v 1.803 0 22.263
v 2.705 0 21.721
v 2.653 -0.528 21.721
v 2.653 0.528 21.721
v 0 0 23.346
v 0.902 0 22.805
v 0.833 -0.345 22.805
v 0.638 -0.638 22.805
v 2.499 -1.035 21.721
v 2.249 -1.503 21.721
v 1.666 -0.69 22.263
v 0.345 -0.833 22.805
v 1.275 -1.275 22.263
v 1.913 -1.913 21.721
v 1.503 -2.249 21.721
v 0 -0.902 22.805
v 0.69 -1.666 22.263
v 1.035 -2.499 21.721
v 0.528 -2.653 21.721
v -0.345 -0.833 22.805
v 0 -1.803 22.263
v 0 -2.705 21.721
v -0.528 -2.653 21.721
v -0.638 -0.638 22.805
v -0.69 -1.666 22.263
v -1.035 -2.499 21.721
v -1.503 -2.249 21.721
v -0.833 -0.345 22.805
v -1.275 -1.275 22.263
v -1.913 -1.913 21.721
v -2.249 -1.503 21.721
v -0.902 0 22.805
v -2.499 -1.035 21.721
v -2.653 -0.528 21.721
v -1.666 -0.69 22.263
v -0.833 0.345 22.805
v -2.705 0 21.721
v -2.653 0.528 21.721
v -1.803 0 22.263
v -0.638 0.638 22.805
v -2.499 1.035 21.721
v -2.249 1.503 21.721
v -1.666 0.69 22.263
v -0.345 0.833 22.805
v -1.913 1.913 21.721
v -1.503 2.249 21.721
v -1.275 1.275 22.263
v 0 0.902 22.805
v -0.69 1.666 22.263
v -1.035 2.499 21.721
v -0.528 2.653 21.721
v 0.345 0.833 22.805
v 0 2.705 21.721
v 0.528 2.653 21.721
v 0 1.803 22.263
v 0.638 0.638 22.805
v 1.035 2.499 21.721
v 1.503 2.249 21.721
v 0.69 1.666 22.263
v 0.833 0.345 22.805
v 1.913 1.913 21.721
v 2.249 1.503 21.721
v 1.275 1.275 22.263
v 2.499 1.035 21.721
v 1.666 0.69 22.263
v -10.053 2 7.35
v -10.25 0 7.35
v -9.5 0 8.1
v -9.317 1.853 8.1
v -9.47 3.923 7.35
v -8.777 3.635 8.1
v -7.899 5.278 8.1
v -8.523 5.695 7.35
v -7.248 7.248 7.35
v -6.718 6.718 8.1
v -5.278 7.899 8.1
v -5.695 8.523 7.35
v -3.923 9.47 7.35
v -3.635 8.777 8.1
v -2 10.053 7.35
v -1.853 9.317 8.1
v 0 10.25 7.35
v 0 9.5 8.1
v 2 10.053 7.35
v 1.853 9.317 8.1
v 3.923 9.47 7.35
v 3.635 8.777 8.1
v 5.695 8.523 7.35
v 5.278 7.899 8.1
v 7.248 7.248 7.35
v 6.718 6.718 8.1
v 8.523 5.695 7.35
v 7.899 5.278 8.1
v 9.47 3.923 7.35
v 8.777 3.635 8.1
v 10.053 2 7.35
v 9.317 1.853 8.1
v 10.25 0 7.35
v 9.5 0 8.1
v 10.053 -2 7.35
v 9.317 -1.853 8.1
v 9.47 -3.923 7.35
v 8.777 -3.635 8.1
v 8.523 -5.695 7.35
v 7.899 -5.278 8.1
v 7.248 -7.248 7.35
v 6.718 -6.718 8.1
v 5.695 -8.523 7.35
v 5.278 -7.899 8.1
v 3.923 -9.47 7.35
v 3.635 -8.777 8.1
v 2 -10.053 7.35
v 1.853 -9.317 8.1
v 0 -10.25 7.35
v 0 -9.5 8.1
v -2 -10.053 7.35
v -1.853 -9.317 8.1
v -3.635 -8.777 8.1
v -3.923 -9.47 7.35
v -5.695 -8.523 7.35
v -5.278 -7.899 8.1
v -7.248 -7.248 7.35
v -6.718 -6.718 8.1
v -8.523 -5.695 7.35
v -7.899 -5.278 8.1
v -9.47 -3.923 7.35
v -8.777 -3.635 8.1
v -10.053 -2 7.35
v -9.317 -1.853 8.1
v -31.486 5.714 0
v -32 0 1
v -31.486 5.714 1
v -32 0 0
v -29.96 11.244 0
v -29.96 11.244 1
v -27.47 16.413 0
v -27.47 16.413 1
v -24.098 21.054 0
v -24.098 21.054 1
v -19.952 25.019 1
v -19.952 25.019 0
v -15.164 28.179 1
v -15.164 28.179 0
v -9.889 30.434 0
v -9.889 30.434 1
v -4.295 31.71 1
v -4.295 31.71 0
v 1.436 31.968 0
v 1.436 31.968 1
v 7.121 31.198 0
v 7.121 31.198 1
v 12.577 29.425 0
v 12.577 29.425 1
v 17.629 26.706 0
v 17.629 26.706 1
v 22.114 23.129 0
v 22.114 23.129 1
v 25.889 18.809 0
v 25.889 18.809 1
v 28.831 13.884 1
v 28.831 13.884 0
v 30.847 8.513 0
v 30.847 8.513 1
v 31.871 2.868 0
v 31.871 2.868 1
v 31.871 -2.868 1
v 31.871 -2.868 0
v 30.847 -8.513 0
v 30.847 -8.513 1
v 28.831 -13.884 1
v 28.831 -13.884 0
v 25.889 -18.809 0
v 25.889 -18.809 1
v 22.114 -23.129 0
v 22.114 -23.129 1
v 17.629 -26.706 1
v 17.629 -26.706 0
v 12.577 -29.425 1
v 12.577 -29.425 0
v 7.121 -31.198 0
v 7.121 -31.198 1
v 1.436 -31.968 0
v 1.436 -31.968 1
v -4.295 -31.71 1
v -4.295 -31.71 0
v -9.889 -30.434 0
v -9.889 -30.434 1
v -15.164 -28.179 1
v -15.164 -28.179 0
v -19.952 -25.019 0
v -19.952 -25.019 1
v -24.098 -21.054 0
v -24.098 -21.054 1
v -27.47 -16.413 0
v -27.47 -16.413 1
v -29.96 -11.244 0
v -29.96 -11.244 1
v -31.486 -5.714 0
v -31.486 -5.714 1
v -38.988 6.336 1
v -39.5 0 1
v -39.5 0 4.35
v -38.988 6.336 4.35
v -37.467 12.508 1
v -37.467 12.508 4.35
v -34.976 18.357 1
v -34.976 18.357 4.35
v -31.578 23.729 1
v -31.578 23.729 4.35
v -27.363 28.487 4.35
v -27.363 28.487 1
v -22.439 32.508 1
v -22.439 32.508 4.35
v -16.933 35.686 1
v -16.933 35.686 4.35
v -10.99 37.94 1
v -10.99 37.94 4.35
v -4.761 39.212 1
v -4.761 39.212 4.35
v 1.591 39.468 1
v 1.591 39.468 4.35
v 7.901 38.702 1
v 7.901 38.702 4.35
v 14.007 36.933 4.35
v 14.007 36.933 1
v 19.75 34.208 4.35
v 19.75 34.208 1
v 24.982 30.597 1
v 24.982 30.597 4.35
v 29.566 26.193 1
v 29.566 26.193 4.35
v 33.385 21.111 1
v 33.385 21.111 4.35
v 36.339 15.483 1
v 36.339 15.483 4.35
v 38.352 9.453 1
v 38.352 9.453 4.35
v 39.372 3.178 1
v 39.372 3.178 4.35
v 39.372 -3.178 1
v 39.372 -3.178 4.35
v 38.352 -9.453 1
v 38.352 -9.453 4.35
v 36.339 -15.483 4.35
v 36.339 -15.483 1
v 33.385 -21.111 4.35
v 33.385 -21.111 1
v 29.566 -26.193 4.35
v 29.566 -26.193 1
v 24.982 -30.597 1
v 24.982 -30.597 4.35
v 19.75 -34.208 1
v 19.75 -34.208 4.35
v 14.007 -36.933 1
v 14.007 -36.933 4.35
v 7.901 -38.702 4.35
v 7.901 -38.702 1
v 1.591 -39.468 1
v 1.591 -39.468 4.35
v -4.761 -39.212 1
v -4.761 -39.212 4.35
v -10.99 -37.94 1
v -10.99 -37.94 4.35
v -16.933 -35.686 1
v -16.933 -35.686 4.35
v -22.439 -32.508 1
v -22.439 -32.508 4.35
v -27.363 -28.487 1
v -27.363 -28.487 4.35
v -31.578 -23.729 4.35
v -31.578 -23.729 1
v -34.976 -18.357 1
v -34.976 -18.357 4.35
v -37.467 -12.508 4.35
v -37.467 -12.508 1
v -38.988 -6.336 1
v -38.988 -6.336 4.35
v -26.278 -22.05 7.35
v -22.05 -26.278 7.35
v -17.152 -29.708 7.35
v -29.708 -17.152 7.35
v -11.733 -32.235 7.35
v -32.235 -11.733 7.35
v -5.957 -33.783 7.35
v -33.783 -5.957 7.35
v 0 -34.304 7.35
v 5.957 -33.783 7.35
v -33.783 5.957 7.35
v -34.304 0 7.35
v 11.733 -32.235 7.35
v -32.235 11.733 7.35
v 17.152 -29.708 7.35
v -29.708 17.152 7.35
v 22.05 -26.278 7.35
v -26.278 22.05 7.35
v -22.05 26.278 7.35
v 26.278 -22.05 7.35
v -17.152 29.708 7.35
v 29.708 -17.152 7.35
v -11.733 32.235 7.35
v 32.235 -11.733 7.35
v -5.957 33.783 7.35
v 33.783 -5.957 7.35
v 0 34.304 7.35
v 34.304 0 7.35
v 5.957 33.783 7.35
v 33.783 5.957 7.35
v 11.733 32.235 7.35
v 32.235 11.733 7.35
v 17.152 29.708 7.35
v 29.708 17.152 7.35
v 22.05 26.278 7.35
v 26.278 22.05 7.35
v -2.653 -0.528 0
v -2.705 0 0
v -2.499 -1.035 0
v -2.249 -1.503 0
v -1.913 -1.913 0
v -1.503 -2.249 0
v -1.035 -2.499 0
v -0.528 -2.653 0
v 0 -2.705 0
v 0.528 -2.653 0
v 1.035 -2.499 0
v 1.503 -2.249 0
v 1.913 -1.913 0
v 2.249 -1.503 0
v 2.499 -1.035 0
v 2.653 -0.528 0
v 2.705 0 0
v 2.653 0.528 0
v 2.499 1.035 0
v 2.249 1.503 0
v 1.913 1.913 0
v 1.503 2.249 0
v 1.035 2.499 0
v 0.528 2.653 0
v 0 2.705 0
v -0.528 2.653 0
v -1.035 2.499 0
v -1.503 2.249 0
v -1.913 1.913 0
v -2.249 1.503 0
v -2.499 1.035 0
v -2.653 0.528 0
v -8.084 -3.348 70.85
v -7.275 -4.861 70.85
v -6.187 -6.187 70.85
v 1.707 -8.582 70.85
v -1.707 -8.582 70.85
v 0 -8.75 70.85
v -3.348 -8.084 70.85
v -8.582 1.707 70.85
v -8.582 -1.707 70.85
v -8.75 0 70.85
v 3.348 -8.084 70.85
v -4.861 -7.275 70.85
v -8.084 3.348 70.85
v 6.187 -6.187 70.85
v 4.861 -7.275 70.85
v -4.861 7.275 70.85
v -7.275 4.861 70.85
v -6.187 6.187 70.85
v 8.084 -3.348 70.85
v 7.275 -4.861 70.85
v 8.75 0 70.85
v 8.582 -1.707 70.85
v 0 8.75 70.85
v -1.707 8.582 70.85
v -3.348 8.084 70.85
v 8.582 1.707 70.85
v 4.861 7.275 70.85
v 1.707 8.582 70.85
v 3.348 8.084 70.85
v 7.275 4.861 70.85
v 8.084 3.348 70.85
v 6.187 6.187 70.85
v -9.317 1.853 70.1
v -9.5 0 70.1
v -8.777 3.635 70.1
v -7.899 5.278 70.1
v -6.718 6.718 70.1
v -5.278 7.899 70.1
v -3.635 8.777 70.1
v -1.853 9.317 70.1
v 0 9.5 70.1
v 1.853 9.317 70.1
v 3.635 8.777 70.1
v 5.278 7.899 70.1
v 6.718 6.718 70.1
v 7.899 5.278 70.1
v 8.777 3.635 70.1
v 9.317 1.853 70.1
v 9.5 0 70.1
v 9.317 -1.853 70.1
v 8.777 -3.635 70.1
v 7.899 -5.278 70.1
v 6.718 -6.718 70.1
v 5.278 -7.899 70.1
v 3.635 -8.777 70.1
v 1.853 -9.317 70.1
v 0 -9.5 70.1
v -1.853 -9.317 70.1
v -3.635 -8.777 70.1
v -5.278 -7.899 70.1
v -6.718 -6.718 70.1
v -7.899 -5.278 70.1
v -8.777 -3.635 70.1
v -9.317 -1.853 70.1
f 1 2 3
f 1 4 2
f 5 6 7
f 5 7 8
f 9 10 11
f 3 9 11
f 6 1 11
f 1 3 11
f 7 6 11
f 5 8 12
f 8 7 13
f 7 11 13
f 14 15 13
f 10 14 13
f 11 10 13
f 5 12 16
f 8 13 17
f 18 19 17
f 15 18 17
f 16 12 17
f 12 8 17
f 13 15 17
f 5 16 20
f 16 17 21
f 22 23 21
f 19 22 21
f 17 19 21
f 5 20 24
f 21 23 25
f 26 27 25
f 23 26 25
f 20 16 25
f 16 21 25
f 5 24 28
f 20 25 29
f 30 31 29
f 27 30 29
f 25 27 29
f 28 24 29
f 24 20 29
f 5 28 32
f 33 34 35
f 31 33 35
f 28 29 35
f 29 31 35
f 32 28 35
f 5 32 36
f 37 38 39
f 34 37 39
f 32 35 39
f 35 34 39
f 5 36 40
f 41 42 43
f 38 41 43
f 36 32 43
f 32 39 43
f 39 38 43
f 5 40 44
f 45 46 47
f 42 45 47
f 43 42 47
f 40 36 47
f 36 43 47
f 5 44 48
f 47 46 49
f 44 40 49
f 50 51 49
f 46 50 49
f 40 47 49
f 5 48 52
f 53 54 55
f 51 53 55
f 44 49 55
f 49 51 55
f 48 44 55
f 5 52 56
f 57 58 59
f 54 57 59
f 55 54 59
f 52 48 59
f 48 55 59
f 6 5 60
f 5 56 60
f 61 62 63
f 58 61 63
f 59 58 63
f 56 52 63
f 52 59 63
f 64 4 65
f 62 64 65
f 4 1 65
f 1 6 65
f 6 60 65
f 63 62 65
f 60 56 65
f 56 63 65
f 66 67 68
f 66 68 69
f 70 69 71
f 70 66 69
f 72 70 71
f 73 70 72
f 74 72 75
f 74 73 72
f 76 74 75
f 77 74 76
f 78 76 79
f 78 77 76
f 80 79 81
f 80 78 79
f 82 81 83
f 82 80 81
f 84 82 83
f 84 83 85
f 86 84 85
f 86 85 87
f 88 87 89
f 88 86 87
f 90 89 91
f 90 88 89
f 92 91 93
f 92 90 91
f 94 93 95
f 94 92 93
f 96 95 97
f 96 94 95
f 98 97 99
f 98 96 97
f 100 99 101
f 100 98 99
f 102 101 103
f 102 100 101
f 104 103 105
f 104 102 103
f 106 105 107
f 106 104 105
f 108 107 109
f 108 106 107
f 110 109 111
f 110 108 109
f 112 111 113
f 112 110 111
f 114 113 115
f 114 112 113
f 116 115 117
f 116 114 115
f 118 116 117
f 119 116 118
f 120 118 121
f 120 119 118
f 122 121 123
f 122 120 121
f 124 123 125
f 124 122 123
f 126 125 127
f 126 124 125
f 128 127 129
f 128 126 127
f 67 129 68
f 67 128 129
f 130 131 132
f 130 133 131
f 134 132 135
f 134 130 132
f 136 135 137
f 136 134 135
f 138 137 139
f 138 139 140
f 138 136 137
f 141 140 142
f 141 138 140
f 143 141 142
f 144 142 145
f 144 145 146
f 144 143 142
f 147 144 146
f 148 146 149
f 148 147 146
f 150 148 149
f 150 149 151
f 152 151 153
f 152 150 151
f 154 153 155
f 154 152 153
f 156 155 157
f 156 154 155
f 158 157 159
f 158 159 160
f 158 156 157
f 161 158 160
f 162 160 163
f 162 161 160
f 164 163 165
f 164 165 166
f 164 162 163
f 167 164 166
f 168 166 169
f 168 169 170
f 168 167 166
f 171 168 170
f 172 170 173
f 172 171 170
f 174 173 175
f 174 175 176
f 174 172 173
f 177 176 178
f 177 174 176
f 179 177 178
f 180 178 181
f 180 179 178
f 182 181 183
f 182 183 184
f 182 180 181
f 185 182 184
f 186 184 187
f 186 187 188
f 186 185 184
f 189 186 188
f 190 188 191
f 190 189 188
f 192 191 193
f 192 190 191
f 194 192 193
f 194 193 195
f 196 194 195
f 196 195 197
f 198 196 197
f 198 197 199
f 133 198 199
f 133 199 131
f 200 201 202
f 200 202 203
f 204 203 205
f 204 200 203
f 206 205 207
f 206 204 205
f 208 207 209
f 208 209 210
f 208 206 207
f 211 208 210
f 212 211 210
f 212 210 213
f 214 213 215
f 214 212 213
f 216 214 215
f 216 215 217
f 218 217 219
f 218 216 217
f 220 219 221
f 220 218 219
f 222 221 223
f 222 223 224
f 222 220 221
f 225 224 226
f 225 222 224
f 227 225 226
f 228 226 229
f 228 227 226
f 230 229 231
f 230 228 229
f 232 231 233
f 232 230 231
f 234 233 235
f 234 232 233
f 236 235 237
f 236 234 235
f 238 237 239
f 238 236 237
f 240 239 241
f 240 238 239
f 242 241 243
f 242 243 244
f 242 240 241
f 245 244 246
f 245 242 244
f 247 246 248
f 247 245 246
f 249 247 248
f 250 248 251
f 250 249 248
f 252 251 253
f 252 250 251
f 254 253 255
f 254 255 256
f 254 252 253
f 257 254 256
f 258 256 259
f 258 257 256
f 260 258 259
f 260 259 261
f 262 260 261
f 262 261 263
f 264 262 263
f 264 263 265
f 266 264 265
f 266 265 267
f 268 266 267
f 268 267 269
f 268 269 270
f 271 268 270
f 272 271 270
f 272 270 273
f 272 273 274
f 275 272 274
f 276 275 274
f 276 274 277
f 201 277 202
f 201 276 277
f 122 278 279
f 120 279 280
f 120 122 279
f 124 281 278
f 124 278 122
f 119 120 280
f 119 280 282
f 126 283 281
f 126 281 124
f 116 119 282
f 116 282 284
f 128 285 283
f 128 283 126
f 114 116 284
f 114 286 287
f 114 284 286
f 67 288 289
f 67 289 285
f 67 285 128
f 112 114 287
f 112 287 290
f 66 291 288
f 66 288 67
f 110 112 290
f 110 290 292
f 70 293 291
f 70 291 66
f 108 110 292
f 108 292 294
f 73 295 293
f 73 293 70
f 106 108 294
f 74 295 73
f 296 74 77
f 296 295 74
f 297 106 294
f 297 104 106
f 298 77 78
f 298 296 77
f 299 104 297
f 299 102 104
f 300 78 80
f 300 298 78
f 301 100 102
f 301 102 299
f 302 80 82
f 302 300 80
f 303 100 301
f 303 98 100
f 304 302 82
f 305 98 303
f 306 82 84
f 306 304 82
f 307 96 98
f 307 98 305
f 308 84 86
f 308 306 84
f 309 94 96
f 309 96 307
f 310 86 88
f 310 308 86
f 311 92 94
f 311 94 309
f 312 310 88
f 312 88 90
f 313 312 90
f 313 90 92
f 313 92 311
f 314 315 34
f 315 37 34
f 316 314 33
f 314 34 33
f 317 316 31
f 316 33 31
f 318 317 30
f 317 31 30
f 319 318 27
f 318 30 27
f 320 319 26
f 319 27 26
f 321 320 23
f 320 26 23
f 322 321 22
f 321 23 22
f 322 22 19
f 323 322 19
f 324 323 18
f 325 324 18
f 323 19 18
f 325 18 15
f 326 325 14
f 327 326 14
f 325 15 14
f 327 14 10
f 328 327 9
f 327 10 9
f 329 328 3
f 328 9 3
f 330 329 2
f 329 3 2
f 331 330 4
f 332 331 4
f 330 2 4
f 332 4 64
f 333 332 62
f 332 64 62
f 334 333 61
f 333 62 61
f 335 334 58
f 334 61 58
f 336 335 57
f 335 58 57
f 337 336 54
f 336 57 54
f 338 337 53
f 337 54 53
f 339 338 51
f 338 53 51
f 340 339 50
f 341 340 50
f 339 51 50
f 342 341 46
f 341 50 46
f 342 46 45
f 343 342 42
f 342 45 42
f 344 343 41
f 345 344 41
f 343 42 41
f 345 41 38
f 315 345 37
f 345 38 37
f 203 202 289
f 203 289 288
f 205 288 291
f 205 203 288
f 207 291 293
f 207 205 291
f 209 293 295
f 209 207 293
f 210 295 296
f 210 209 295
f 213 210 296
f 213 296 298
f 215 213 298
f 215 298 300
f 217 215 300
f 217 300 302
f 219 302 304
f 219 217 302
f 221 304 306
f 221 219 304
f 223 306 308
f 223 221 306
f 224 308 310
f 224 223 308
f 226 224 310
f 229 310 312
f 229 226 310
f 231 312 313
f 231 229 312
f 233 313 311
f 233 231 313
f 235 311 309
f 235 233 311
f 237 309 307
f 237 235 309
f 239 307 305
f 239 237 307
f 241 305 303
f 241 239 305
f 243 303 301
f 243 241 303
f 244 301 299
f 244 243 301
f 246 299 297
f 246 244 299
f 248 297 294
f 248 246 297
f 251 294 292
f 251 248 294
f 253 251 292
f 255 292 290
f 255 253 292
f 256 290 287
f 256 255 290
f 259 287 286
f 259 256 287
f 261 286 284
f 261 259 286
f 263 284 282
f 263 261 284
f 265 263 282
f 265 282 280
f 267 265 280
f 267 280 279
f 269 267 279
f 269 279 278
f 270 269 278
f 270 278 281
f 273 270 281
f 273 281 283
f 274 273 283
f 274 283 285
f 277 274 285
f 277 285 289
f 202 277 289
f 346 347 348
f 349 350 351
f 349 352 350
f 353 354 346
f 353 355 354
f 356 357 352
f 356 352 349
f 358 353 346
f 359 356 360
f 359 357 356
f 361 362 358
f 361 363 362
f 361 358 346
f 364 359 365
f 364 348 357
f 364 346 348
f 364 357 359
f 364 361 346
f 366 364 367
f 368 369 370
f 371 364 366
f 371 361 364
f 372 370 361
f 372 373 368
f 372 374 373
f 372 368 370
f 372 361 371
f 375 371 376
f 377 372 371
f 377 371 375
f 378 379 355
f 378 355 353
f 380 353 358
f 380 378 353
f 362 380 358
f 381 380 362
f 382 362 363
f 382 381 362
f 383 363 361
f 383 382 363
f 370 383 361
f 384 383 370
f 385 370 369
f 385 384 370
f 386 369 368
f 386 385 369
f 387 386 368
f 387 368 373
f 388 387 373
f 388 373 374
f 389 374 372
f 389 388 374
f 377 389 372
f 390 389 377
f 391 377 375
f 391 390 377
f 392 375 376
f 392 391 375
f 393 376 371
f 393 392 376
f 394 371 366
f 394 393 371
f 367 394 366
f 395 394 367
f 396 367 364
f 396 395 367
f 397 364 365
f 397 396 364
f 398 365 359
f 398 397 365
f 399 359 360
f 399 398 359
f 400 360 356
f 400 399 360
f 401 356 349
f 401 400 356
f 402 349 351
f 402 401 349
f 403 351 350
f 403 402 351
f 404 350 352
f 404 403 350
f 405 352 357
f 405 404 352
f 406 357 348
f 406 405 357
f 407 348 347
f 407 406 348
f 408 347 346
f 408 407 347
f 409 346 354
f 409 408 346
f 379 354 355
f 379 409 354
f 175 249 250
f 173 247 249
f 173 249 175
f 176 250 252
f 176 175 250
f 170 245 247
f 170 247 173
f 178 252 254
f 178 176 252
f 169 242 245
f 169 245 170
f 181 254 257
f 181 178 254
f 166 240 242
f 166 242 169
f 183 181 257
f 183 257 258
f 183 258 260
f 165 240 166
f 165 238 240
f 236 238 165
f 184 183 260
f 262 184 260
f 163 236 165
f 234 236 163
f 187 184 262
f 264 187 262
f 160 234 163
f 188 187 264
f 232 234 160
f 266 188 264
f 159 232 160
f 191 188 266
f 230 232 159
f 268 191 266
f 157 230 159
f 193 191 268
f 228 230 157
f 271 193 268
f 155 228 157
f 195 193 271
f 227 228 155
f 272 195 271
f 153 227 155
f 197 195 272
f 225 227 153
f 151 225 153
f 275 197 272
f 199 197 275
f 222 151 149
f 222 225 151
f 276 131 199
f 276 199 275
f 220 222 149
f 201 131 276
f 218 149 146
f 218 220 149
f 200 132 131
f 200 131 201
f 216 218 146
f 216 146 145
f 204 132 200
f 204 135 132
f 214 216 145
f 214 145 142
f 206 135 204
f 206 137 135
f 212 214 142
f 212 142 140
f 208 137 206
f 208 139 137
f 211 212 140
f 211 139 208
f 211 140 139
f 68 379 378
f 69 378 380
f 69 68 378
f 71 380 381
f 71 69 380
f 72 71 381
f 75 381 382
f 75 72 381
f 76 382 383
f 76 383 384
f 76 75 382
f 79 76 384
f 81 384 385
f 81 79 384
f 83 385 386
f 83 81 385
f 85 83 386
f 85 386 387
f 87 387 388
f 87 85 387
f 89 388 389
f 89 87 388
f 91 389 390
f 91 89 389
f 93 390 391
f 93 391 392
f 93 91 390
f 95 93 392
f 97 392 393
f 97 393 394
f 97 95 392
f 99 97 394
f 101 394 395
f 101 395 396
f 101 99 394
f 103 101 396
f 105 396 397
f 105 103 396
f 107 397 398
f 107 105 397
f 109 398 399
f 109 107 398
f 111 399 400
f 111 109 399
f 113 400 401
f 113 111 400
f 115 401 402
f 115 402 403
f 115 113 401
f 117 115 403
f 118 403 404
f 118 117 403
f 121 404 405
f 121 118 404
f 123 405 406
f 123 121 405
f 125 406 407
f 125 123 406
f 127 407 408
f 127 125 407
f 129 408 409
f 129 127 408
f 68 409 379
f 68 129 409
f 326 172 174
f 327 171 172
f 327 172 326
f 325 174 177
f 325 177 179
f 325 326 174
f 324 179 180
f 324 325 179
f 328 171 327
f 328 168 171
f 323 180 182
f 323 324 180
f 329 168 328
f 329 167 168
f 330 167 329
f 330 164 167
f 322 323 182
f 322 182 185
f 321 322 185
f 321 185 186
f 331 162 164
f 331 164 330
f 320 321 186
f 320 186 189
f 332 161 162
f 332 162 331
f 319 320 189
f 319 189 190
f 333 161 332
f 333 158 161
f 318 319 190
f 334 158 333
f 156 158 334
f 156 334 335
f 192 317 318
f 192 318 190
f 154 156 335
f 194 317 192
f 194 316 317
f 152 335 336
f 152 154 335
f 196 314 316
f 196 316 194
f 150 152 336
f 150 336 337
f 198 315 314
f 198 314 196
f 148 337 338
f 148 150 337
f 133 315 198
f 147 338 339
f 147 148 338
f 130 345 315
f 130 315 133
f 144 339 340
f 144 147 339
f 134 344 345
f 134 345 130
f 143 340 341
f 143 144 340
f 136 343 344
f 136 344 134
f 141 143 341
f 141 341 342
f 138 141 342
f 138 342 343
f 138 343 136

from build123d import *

# Parameters (mm, degrees)
F2_SIZE  = 0.75
F3_SIZE2 = 3
F3_SIZE  = 5.1961524227
F5_D     = 5.4102
F5_DEPTH = 21.721
F5_TIP   = 1.6253880605


with BuildPart() as f1:
    # F0 (on Front) → F1 (revolve)
    with BuildSketch(Plane.XZ):
        Polygon((-32, 0), (0, 0), (0, 70.85), (-9.5, 70.85), (-9.5, 7.35), (-39.5, 7.35), (-39.5, 1), (-32, 1), align=None)
    revolve(axis=Axis((0, 0, 35.425), (0, 0, -1)))

    # F2
    f2_edges = [f1.edges().sort_by_distance(p)[0] for p in [
        (9.5, 0, 70.85),
        (9.5, 0, 7.35),
    ]]
    chamfer(f2_edges, length=F2_SIZE)

    # F3
    f3_edges = [f1.edges().sort_by_distance(p)[0] for p in [
        (39.5, 0, 7.35),
    ]]
    f3_side = f1.faces().sort_by_distance((11.367229, 0, 7.35))[0]
    chamfer(f3_edges, length=F3_SIZE, length2=F3_SIZE2, reference=f3_side)

    # F5
    with Locations(Plane(origin=(0, 0, 0), x_dir=(1, 0, 0), z_dir=(0, 0, -1))):
        with Locations((0, 0)):
            Hole(F5_D / 2, depth=F5_DEPTH)
            with Locations((0, 0, -(F5_DEPTH + F5_TIP / 2))):  # 118° drill point
                Cone(0, F5_D / 2, F5_TIP, mode=Mode.SUBTRACT)


solid = f1.part
